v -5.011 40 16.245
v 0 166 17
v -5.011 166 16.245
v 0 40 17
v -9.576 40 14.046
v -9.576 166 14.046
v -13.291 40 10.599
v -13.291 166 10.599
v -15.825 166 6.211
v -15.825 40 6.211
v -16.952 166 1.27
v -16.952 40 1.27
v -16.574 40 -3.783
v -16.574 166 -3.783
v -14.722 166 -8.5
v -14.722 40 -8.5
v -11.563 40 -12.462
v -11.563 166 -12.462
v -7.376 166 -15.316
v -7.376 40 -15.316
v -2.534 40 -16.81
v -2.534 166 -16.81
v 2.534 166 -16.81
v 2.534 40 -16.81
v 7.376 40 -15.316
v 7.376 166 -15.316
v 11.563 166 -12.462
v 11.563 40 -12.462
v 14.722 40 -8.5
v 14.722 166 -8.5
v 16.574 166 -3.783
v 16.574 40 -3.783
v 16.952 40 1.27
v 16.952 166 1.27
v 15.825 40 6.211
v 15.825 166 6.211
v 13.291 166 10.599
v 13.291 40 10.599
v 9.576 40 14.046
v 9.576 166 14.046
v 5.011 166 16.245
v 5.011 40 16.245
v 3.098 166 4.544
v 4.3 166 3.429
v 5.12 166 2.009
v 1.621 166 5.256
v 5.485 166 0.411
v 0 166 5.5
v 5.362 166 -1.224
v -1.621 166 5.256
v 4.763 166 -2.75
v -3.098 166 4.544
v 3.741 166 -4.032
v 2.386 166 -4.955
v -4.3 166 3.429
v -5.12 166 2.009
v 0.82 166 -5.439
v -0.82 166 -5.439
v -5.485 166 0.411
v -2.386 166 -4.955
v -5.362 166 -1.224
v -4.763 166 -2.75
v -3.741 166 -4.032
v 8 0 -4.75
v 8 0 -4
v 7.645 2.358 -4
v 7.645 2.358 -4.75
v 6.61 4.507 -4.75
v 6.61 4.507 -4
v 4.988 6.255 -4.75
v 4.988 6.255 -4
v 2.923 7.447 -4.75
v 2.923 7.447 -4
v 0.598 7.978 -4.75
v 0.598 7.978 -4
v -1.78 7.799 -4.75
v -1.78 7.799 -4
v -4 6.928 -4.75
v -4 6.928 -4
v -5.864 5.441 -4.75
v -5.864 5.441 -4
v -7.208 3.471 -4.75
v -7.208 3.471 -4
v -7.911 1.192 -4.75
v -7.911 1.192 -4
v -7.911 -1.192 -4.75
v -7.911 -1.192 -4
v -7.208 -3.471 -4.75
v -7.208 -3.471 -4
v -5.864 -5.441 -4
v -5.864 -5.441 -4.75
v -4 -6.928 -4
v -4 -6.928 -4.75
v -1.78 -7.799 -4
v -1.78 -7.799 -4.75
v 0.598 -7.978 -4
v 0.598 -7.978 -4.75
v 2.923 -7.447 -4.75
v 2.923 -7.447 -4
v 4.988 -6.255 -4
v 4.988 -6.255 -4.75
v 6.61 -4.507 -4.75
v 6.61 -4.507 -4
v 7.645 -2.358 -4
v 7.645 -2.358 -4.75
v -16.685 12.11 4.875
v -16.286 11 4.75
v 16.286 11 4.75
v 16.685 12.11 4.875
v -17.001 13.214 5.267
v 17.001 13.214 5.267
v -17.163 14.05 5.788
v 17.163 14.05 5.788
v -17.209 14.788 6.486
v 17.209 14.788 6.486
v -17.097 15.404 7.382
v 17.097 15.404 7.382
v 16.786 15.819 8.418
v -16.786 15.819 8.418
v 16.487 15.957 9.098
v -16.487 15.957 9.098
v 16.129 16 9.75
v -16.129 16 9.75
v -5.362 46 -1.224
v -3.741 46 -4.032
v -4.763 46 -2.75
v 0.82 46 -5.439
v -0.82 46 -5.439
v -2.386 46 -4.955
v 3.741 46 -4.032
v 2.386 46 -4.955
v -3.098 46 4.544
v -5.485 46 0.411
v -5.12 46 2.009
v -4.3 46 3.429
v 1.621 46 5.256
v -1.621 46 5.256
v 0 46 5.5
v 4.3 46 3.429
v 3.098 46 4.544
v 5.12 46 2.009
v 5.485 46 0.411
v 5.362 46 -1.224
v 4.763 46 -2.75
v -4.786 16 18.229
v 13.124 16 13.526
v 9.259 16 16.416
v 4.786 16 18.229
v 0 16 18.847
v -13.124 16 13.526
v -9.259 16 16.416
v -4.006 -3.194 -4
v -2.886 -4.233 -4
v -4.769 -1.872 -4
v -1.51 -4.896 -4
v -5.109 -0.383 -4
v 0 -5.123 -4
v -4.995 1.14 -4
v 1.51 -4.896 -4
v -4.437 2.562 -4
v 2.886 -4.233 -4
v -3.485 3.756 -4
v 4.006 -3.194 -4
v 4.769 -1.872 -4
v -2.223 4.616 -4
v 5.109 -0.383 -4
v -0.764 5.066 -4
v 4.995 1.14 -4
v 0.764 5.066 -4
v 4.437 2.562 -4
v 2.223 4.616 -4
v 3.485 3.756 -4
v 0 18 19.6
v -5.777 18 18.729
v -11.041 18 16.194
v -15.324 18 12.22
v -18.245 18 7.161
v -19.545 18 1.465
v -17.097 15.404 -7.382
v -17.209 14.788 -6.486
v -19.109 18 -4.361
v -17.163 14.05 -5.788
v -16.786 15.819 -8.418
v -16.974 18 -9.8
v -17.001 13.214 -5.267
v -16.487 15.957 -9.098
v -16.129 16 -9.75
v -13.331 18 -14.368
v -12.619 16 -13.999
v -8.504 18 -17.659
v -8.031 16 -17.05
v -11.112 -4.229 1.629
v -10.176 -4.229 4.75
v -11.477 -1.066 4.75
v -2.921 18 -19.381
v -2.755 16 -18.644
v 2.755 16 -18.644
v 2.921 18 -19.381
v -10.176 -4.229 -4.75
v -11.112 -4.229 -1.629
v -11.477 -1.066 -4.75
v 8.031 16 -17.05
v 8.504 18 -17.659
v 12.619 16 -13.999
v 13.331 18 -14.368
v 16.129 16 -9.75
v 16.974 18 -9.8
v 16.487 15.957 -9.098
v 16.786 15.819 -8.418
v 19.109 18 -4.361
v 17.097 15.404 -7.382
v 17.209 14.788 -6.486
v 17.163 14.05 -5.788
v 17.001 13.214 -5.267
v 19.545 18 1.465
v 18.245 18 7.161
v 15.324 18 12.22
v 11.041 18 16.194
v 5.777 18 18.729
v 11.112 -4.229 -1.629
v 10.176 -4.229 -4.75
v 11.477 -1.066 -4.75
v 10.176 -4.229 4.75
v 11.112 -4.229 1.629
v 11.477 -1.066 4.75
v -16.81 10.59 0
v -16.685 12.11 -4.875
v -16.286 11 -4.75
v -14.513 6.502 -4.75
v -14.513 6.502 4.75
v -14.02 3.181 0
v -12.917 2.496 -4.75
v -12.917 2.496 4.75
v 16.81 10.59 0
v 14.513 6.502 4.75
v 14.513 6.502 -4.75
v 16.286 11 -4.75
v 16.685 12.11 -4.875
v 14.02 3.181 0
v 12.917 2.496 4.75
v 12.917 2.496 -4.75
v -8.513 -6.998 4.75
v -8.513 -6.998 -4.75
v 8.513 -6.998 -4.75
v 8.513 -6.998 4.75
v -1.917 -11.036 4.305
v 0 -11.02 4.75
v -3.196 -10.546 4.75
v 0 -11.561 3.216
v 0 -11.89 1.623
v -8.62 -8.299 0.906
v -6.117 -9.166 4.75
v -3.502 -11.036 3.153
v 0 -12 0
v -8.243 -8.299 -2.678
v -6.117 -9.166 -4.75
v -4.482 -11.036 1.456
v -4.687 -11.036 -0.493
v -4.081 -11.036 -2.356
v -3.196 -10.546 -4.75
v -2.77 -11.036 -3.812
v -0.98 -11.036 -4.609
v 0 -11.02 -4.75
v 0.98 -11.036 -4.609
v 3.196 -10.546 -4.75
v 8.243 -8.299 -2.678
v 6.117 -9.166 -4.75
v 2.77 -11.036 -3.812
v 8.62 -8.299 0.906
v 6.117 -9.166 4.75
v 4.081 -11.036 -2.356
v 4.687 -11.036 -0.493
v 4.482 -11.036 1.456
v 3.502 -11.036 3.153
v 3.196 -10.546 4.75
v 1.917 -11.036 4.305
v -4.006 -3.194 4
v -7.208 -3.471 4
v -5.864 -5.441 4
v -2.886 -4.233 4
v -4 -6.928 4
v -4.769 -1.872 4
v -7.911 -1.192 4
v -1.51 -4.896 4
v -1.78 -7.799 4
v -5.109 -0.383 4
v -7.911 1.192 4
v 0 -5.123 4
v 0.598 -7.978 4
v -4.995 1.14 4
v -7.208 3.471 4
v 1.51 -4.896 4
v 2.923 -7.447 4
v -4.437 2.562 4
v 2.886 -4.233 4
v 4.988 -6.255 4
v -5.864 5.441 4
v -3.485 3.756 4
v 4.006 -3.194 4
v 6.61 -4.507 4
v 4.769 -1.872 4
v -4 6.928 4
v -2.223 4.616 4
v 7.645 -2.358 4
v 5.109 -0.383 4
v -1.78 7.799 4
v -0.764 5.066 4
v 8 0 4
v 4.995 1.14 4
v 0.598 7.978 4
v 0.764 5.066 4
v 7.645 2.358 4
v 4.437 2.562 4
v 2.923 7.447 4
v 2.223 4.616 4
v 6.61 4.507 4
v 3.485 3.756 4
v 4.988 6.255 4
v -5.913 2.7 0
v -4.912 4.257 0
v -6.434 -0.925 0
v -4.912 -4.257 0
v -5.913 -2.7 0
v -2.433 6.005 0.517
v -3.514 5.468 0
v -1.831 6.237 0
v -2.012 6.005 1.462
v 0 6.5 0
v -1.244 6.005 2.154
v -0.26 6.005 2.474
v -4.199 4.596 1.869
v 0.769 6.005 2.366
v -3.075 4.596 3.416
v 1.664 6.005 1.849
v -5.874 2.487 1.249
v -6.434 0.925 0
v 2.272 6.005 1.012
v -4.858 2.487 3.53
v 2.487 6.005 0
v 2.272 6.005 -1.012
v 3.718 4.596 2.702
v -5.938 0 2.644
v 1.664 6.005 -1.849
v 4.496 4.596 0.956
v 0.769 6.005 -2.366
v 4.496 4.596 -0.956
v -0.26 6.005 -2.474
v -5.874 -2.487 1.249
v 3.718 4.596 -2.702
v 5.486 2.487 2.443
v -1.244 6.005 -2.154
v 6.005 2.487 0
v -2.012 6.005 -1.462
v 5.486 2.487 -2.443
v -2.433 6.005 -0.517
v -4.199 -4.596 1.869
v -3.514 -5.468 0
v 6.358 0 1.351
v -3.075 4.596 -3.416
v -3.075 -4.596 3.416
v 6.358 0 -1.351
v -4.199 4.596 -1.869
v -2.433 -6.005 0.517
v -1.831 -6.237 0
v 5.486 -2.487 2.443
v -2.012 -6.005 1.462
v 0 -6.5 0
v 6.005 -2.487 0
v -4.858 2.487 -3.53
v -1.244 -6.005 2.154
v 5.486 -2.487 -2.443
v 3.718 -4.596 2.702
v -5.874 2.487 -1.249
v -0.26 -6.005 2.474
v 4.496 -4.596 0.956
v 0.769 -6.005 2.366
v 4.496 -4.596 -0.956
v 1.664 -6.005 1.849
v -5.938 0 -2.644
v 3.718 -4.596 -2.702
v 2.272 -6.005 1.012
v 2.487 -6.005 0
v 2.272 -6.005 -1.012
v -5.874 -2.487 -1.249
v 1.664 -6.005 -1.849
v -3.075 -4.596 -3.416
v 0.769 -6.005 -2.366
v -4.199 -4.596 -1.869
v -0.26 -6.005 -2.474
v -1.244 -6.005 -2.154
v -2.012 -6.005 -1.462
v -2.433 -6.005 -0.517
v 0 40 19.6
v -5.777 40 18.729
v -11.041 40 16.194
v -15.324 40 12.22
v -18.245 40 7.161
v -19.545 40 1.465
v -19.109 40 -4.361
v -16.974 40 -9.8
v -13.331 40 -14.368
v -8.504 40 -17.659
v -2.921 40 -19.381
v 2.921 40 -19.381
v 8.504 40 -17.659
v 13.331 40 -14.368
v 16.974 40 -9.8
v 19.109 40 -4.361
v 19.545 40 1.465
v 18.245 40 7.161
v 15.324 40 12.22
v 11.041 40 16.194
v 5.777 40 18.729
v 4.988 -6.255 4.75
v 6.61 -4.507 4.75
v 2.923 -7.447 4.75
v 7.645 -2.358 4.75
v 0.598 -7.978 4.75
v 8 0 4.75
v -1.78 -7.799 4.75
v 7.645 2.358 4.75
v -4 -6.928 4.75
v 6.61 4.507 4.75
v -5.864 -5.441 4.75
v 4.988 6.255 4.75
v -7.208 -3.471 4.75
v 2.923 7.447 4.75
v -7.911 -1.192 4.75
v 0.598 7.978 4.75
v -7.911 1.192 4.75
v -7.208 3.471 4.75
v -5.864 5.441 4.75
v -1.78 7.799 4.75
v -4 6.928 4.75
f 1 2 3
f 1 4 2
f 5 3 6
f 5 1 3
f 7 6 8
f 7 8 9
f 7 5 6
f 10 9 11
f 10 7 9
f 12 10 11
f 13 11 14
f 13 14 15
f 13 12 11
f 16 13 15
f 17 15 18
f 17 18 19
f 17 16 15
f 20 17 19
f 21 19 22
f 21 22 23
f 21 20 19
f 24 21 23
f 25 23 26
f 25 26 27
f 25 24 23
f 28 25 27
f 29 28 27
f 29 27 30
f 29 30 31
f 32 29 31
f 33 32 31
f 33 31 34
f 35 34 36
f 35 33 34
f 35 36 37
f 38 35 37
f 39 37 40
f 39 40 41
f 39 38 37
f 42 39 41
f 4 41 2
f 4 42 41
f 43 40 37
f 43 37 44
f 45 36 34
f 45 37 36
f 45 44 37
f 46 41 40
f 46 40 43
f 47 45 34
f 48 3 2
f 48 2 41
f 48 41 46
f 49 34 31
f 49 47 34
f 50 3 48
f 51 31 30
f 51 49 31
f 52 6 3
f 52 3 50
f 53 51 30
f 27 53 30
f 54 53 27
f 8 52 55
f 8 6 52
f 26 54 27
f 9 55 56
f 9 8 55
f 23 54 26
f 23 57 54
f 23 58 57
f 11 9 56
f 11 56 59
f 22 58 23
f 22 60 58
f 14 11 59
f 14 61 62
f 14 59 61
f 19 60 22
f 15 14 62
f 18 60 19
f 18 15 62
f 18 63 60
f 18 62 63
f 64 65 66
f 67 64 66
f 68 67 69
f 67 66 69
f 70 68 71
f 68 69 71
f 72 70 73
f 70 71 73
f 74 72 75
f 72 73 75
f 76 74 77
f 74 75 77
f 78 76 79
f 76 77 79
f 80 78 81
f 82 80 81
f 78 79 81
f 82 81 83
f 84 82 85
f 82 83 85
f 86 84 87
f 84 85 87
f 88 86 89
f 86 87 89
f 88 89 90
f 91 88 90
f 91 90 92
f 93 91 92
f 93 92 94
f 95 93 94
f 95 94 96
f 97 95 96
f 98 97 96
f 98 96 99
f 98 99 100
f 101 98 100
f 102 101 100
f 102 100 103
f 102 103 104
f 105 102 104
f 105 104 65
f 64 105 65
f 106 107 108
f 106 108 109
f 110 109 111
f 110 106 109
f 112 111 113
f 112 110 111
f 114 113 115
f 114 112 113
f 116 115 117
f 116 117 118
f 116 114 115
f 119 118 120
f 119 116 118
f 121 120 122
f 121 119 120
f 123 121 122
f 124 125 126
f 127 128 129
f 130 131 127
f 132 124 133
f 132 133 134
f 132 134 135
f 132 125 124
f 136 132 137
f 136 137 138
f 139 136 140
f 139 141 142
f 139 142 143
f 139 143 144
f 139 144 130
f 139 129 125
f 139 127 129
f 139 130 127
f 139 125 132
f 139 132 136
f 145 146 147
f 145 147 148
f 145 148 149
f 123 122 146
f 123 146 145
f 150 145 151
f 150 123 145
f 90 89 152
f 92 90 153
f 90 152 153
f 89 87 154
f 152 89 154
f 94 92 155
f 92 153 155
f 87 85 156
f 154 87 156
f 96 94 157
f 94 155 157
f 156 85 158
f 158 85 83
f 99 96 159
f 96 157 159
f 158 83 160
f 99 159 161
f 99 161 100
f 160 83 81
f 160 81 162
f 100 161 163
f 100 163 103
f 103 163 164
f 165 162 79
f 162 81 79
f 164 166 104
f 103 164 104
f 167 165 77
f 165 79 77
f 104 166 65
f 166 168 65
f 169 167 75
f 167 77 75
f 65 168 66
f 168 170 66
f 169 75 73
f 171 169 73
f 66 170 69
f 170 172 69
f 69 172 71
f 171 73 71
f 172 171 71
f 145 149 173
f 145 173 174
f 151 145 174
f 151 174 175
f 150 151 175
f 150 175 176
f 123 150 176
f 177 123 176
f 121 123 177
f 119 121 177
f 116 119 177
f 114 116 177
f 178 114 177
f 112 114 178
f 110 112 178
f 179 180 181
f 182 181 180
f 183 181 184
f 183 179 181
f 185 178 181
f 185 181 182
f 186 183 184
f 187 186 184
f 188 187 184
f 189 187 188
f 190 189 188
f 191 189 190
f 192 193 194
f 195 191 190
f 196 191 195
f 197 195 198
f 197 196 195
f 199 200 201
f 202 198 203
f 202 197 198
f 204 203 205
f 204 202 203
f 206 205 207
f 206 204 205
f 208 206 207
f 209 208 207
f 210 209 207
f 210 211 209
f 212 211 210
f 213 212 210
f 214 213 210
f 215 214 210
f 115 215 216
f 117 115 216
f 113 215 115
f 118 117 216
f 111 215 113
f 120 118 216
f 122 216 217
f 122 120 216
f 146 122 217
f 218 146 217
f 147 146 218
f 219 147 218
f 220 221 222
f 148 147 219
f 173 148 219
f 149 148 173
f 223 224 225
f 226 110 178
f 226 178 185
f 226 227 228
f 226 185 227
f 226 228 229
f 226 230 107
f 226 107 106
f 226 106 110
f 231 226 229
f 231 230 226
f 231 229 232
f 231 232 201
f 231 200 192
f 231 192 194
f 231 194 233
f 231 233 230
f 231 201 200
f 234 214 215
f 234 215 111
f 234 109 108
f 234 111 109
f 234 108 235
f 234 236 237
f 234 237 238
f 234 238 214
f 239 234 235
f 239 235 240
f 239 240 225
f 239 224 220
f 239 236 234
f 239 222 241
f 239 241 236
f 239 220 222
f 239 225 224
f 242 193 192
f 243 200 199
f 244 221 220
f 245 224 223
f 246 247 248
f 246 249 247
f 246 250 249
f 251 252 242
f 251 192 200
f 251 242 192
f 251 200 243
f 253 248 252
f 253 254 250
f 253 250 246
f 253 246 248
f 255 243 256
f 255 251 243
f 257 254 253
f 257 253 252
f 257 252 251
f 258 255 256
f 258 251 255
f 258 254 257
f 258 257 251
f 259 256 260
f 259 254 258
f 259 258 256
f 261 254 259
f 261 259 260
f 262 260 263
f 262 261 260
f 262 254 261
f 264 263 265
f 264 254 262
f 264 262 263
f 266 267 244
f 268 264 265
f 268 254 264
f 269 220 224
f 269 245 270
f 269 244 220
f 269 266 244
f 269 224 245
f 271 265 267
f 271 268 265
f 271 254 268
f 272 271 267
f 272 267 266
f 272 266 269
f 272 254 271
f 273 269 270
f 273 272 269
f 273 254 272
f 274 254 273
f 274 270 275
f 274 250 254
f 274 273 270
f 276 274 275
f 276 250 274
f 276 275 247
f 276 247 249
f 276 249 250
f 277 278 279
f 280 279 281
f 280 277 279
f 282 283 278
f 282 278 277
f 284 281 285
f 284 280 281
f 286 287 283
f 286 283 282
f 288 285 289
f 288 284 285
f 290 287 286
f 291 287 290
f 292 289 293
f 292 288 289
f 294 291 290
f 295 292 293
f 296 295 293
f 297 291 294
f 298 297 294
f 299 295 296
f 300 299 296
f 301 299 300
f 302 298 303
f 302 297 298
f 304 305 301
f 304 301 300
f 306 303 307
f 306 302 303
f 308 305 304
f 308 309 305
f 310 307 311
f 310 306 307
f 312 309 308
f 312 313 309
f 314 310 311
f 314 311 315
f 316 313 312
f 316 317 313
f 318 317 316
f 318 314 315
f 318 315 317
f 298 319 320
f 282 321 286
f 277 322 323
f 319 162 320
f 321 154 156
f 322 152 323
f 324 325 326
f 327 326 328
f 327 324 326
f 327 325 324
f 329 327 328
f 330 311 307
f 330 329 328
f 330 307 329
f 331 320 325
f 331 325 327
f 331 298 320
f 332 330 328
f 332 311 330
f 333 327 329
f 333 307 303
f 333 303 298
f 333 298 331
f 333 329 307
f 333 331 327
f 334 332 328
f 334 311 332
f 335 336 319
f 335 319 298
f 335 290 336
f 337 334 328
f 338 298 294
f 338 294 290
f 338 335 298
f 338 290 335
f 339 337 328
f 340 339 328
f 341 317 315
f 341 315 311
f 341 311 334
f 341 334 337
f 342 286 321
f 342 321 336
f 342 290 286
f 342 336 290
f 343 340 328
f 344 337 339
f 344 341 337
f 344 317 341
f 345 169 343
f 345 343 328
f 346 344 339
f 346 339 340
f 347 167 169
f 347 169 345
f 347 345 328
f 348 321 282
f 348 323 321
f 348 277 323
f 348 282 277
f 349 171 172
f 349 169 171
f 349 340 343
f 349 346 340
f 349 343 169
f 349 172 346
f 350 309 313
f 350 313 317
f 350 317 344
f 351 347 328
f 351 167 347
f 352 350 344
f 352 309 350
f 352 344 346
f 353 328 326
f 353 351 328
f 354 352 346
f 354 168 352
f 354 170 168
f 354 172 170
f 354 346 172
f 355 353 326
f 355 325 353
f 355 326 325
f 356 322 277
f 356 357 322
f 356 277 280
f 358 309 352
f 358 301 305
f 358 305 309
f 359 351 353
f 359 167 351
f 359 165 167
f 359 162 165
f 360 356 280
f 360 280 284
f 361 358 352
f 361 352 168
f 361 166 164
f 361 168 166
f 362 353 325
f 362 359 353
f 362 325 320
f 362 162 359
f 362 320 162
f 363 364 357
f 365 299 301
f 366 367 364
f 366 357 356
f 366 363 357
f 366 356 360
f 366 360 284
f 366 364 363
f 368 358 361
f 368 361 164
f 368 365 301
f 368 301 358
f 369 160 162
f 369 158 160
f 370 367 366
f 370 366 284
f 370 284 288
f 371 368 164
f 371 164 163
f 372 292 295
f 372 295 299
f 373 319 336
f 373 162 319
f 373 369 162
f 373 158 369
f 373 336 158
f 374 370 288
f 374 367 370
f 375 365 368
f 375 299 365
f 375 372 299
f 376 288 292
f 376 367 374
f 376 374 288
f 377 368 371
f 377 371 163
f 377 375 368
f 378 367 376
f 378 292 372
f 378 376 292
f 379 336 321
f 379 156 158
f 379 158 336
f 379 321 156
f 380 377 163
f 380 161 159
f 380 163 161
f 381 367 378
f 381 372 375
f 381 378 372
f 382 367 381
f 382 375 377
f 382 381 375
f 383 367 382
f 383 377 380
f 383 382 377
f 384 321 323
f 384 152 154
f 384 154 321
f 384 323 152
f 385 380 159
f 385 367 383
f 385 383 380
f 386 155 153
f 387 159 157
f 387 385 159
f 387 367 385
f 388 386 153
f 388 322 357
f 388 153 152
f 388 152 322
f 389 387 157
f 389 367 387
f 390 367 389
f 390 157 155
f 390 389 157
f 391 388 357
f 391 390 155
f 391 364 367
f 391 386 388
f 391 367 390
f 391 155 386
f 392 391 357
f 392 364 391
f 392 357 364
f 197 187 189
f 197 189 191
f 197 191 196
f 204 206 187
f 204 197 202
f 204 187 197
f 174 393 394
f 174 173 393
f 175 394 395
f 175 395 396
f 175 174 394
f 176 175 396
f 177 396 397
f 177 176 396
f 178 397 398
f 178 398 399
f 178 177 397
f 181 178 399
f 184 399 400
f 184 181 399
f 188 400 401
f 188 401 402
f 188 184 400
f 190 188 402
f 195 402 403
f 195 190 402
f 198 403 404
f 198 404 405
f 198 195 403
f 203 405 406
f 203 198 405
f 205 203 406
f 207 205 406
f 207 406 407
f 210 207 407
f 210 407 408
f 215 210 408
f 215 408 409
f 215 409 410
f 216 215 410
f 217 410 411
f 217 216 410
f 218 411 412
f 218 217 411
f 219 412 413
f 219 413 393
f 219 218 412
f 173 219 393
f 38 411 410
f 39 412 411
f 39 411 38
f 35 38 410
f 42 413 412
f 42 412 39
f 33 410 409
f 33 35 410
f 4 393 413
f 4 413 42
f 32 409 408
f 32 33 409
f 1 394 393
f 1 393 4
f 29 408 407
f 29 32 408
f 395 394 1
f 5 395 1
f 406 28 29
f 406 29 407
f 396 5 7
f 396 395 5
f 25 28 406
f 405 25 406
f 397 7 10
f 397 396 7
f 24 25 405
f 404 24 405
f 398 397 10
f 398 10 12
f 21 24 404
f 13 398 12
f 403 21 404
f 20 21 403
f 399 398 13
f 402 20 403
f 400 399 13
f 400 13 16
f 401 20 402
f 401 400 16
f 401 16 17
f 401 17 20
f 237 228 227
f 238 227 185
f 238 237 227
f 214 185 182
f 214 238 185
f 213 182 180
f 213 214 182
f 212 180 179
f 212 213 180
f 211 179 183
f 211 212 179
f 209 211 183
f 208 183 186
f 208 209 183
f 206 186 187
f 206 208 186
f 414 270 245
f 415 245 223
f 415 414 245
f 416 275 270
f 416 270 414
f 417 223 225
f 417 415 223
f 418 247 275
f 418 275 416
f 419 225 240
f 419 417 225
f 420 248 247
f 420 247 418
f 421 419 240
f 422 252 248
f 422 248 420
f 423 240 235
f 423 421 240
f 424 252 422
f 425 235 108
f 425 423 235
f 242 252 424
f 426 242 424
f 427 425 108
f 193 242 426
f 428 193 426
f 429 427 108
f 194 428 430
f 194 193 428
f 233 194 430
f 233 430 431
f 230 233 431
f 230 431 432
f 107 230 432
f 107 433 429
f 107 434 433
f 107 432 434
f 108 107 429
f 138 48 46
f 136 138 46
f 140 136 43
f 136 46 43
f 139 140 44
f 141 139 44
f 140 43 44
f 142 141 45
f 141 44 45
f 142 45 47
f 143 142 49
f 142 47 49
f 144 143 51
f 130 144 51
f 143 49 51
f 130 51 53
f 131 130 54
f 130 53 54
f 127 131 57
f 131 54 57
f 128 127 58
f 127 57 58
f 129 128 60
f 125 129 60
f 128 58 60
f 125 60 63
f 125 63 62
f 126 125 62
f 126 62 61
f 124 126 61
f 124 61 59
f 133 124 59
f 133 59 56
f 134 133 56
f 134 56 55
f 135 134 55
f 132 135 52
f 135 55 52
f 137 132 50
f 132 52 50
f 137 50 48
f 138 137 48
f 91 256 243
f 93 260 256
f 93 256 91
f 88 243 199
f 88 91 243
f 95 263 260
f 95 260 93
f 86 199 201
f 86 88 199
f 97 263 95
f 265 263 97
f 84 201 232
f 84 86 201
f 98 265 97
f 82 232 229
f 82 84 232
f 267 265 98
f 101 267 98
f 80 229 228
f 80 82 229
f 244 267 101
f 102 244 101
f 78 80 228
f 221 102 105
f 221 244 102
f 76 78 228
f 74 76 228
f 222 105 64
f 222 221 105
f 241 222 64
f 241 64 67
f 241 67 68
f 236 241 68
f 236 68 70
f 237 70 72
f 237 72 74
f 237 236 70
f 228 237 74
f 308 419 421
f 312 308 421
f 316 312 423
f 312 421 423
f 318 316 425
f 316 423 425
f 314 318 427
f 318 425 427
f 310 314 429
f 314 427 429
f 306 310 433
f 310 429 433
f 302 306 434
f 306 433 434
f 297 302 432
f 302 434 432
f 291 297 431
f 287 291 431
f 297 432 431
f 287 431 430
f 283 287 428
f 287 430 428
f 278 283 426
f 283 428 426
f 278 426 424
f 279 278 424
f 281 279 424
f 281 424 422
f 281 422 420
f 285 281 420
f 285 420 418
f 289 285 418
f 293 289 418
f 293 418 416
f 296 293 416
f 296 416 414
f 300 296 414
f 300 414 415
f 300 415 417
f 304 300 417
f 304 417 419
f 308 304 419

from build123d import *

# Parameters (mm, degrees)
CUT_EXTRUDE1_DEPTH = 25
CUT_EXTRUDE2_START = -4
SKETCH4_R          = 8
CUT_EXTRUDE2_DEPTH = 4
CUT_EXTRUDE3_START = 8
SKETCH4_2_R        = 8
CUT_EXTRUDE3_DEPTH = 4
SKETCH5_R          = 5.5
CUT_EXTRUDE4_DEPTH = 120


with BuildPart() as part:
    # Sketch1 → Revolve1 (revolve)
    with BuildSketch(Plane.XY):
        with BuildLine():
            Line((0, 166), (-17, 166))
            Line((-17, 166), (-17, 40))
            Line((-17, 40), (-19.6, 40))
            Line((-19.6, 40), (-19.6, 18))
            Line((-19.6, 18), (-11.23029167, -4.228539819))
            ThreePointArc((-11.23029167, -4.228539819), (-6.828525543, -9.867686604), (0, -12))
            Line((0, -12), (0, 166))
        make_face()
    revolve(axis=Axis((0, 166, 0), (0, -1, 0)))

    # Sketch2 → Cut-Extrude1 (cut, symmetric)
    with BuildSketch(Plane(origin=(0, 0, 0), x_dir=(0, 0, -1), z_dir=(1, 0, 0))):
        with BuildLine():
            Line((-4.75, -11.548161577), (-4.75, 11))
            ThreePointArc((-4.75, 11), (-6.214466094, 14.535533906), (-9.75, 16))
            Line((-9.75, 16), (-25.870257209, 16))
            Line((-25.870257209, 16), (-25.870257209, -11.548161577))
            Line((-25.870257209, -11.548161577), (-4.75, -11.548161577))
        make_face()
        with BuildLine():
            Line((25.870257209, 16), (25.870257209, -11.548161577))
            Line((25.870257209, -11.548161577), (4.75, -11.548161577))
            Line((4.75, -11.548161577), (4.75, 11))
            ThreePointArc((4.75, 11), (6.214466094, 14.535533906), (9.75, 16))
            Line((9.75, 16), (25.870257209, 16))
        make_face()
    extrude(amount=CUT_EXTRUDE1_DEPTH, both=True, mode=Mode.SUBTRACT)

    # Sketch3 → Cut-Revolve1 (revolve, cut)
    with BuildSketch(Plane.XY):
        with BuildLine():
            Line((0, -6.5), (0, 6.5))
            ThreePointArc((0, 6.5), (-6.5, 0), (0, -6.5))
        make_face()
    revolve(axis=Axis((0, -12, 0), (0, 1, 0)), mode=Mode.SUBTRACT)

    # Sketch4 → Cut-Extrude2 (cut)
    with BuildSketch(Plane.XY.offset(CUT_EXTRUDE2_START)):
        Circle(SKETCH4_R)
    extrude(amount=-CUT_EXTRUDE2_DEPTH, mode=Mode.SUBTRACT)

    # Sketch4<2> → Cut-Extrude3 (cut)
    with BuildSketch(Plane.XY.offset(CUT_EXTRUDE3_START)):
        Circle(SKETCH4_2_R)
    extrude(amount=-CUT_EXTRUDE3_DEPTH, mode=Mode.SUBTRACT)

    # Sketch5 → Cut-Extrude4 (cut)
    with BuildSketch(Plane(origin=(0, 166, 0), x_dir=(1, 0, 0), z_dir=(0, 1, 0))):
        Circle(SKETCH5_R)
    extrude(amount=-CUT_EXTRUDE4_DEPTH, mode=Mode.SUBTRACT)


solid = part.part
